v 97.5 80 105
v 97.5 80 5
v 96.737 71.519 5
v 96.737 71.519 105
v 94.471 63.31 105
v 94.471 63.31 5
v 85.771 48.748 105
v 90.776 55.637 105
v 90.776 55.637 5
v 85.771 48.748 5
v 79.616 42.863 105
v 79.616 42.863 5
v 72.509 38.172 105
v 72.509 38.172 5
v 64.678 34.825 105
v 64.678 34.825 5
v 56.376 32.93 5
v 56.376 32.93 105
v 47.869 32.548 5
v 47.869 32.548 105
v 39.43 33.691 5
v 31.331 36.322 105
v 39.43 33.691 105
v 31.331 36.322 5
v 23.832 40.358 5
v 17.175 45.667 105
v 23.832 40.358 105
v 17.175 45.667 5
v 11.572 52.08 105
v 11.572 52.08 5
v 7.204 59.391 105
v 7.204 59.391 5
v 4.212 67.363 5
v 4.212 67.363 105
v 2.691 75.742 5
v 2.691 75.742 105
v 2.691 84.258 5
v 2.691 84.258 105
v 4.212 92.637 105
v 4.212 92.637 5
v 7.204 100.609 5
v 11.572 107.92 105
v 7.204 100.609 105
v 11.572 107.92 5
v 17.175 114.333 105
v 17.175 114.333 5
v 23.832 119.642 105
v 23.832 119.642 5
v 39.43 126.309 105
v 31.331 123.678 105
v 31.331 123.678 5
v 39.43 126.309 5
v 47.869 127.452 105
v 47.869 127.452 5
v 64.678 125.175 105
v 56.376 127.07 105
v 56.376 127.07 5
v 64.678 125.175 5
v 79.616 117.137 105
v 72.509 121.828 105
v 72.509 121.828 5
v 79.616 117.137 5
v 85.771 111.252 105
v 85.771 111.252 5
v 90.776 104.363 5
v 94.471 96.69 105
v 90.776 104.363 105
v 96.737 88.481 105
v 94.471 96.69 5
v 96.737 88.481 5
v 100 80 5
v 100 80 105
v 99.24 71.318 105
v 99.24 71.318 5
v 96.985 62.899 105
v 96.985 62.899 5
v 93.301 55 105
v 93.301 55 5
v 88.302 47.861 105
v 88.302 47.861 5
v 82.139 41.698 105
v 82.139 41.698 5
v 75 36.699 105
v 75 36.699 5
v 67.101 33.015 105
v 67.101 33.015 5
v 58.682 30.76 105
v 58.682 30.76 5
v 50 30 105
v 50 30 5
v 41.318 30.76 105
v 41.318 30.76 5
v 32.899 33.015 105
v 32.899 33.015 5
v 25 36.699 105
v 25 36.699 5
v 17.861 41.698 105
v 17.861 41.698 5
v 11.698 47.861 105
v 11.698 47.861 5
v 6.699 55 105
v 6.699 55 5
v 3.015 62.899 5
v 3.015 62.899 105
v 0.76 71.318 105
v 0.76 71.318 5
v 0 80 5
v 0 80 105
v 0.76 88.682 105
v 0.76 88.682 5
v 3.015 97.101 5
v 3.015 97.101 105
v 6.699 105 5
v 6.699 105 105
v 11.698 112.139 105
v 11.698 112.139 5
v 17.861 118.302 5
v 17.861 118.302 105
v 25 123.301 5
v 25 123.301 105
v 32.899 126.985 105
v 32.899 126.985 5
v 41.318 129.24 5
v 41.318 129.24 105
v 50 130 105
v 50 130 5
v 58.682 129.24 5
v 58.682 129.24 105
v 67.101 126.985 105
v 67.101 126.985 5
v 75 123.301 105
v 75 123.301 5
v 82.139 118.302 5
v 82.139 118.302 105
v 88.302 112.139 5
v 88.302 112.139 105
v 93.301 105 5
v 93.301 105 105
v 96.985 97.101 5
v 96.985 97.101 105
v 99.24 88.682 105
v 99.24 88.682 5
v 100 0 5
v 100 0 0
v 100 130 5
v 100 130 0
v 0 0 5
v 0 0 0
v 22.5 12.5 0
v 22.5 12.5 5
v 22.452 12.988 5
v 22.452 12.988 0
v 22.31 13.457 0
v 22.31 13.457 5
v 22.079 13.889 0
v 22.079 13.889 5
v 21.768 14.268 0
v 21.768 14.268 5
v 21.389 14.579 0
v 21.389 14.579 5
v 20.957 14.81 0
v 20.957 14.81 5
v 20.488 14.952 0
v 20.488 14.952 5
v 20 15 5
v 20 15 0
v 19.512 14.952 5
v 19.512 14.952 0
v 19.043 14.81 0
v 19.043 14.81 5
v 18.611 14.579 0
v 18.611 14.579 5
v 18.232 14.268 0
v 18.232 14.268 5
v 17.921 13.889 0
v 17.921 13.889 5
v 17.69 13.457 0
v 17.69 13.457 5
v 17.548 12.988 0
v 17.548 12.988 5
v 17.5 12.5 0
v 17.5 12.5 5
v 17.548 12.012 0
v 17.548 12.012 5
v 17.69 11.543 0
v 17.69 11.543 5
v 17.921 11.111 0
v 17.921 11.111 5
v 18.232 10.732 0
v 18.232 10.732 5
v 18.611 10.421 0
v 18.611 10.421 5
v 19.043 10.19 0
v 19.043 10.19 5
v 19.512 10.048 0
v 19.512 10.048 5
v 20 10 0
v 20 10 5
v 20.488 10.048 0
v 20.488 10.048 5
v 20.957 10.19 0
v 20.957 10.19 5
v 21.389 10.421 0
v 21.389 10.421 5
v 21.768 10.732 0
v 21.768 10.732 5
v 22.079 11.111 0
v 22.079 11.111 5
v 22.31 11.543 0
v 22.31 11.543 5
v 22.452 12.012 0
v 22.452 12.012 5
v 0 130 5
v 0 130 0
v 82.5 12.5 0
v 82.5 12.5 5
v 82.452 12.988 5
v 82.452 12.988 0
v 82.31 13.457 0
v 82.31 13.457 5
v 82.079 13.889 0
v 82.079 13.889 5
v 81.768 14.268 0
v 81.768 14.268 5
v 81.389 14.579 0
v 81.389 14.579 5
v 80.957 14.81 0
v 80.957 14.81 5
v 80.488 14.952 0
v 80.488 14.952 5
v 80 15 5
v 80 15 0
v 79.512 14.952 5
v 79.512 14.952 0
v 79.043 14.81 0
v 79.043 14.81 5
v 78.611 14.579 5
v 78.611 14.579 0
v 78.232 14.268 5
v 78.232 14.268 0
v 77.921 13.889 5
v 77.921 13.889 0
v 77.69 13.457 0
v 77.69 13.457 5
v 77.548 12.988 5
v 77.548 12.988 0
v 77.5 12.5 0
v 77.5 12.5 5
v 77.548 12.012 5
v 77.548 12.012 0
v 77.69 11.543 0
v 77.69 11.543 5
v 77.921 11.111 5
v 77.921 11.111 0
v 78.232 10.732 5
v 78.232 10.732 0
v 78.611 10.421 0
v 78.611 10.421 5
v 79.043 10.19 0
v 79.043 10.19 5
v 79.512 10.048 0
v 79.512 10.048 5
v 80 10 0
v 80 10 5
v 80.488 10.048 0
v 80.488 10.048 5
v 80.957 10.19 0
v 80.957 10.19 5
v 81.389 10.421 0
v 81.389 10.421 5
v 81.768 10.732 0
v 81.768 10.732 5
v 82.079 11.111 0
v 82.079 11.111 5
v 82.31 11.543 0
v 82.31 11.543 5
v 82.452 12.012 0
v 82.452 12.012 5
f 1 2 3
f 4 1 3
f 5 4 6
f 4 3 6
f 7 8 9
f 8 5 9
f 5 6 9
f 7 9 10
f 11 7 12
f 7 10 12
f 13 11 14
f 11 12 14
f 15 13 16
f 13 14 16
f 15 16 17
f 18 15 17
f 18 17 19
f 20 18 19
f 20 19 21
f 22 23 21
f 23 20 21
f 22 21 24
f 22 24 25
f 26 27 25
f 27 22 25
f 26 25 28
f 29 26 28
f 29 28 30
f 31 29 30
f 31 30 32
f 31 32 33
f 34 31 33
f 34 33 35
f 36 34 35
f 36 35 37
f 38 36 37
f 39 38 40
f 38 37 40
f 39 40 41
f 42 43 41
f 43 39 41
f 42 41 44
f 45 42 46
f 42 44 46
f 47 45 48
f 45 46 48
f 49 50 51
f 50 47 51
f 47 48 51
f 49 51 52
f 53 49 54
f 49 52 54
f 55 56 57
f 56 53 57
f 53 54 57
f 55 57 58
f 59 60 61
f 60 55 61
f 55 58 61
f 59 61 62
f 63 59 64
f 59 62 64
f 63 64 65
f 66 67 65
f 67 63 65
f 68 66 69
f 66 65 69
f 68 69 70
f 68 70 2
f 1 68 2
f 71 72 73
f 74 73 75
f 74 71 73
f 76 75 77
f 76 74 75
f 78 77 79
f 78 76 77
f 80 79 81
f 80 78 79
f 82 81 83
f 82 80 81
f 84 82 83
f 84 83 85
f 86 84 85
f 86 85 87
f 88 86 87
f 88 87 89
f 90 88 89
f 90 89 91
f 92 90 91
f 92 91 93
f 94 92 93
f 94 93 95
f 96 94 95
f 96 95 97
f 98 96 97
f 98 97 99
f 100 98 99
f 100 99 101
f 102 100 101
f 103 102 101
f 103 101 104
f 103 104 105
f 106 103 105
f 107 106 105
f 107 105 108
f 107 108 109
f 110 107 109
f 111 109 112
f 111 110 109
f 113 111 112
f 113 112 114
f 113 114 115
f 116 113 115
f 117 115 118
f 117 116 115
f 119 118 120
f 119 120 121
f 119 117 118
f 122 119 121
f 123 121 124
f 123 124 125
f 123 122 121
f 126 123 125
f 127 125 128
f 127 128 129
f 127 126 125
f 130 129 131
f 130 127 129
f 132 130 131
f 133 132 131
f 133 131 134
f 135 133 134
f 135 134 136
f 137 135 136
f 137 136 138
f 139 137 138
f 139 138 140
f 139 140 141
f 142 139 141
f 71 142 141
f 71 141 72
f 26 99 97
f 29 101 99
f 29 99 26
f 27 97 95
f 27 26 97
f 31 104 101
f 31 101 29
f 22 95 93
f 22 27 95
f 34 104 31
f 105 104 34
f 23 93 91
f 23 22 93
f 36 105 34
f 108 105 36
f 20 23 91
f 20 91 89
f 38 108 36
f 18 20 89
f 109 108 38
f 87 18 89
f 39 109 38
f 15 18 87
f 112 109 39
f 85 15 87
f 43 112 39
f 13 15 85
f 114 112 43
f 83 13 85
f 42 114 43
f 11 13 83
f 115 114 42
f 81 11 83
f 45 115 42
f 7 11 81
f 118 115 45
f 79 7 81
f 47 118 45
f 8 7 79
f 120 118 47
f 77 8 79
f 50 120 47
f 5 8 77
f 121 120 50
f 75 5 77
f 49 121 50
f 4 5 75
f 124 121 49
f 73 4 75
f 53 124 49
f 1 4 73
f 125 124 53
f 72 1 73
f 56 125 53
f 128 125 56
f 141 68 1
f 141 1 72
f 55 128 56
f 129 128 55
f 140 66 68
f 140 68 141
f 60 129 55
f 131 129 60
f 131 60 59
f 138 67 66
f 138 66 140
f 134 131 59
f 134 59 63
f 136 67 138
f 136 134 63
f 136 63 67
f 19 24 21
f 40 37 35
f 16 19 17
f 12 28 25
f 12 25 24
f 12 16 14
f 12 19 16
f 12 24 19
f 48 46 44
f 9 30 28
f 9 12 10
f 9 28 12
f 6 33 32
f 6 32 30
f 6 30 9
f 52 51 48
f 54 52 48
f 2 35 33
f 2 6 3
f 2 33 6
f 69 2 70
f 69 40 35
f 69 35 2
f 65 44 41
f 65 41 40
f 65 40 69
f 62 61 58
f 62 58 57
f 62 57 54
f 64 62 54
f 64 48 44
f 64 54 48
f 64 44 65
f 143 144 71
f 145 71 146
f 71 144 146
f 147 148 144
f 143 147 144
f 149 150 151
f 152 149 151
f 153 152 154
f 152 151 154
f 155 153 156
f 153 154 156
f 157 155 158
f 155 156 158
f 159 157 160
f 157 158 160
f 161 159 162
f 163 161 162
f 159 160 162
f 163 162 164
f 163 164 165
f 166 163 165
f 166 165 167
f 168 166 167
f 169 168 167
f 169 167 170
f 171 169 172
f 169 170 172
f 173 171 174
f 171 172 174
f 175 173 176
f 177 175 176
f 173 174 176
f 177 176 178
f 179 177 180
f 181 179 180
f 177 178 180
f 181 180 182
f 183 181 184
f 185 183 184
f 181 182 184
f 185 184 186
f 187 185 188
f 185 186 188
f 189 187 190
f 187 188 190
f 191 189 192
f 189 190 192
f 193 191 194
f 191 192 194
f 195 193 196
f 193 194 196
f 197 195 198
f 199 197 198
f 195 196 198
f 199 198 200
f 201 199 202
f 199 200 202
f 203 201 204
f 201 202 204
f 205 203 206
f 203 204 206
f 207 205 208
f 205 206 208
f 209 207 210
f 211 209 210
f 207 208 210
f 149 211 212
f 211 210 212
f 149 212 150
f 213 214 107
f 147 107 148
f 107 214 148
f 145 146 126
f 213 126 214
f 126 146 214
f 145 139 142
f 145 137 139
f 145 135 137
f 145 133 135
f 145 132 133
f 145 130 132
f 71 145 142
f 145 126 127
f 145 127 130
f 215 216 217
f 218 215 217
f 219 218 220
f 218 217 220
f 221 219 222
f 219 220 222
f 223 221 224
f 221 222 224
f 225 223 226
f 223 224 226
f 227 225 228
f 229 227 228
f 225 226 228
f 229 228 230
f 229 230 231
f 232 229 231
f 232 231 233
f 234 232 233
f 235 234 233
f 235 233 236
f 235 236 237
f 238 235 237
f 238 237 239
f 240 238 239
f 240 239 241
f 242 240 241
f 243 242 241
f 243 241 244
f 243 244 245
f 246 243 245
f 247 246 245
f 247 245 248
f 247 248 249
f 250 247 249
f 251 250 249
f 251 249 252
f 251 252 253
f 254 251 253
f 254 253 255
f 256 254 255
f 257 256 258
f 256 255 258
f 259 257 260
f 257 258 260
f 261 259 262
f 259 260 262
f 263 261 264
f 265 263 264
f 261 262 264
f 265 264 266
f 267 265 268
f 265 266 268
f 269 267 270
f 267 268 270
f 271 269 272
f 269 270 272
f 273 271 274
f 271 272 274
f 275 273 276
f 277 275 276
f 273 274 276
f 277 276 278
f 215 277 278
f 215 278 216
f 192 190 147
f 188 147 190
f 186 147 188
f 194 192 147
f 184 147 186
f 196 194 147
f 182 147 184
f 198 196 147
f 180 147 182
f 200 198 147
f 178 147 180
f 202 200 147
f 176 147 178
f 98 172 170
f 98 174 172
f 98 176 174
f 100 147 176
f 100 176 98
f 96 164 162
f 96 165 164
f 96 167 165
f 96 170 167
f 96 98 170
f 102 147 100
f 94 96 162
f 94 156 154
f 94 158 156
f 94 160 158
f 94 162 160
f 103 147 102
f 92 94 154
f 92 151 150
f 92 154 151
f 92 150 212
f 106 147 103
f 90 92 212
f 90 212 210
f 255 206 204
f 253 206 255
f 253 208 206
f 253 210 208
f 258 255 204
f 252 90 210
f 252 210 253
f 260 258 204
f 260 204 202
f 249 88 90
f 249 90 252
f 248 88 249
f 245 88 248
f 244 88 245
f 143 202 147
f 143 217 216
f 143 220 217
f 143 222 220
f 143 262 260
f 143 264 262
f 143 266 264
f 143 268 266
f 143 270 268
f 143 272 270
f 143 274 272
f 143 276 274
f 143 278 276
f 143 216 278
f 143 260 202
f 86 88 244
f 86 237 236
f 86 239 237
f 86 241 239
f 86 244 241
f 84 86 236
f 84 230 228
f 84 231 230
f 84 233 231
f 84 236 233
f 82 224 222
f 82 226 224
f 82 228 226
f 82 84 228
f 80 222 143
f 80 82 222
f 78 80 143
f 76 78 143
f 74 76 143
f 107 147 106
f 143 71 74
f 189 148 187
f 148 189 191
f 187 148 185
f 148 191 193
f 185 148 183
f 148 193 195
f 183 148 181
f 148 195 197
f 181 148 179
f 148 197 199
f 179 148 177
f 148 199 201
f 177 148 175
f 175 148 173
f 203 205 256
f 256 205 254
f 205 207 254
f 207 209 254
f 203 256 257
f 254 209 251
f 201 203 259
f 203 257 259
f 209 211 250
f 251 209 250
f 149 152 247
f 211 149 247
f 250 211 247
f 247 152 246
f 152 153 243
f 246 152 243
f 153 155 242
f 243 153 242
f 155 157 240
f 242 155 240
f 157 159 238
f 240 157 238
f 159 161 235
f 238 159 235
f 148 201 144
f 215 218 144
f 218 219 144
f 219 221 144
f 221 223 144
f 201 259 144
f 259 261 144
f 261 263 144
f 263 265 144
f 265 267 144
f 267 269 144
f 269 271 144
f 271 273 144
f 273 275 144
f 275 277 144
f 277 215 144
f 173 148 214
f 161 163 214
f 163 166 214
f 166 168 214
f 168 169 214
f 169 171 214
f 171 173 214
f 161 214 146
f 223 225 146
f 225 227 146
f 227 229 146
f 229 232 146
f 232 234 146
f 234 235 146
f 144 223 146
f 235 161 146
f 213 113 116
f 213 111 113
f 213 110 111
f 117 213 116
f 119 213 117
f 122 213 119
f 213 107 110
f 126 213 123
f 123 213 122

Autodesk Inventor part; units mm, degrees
ref_plane "YZ Plane" through (0, 0, 0) normal (1, 0, 0) x (0, 1, 0)
ref_plane "XZ Plane" through (0, 0, 0) normal (0, 1, 0) x (-1, 0, 0)
ref_plane "XY Plane" through (0, 0, 0) normal (0, 0, 1) x (1, 0, 0)
sketch "Sketch1" plane through (0, 0, 0) normal (0, 0, 1) x (1, 0, 0)
  line L0 (0, 0) -> (100, 0)
  line L1 (100, 0) -> (100, 130)
  line L2 (100, 130) -> (0, 130)
  line L3 (0, 130) -> (0, 0)
  dimension "d0" = 100
  dimension "d1" = 130
extrude "Extrusion1" add sketch "Sketch1" along normal blind 5
sketch "Sketch2" plane through (0, 0, 5) normal (0, 0, 1) x (1, 0, 0)
  line L0 (0, 130) -> (0, 0) projected
  line L1 (100, 130) -> (0, 130) projected
  line L2 (0, 0) -> (100, 0)
  line L3 (100, 0) -> (100, 130)
  line L4 (100, 130) -> (0, 130)
  line L5 (0, 130) -> (0, 0)
  circle A0 centre (50, 80) radius 50
  circle A1 centre (50, 80) radius 47.5
  dimension "d4" = 95
extrude "Extrusion2" add sketch "Sketch2" along normal blind 100 contours A0
sketch "Sketch3" plane through (0, 0, 5) normal (0, 0, 1) x (1, 0, 0)
  line L0 (100, 0) -> (100, 130) projected
  line L1 (0, 80) -> (0, 0) projected
  line L2 (100, 0) -> (0, 0)
  line L3 (0, 0) -> (0, 25)
  line L4 (0, 25) -> (100, 25)
  line L5 (100, 25) -> (100, 0)
  circle A0 centre (80, 12.5) radius 2.5
  circle A1 centre (20, 12.5) radius 2.5
  point P0 (0, 12.5)
  point P1 (100, 12.5)
  dimension "d7" = 25
  dimension "d8" = 5
  dimension "d9" = 5
  dimension "d10" = 20
  dimension "d11" = 20
  dimension "d12" = 12.5
  dimension "d13" = 12.5
extrude "Extrusion3" cut sketch "Sketch3" against normal blind 100 contours A0 | A1
thread "Thread1" size "M5x0.8" class "6H" standard "ANSI Metric M Profile" full length
thread "Thread2" size "M5x0.8" class "6H" standard "ANSI Metric M Profile" full length
properties part number "Reservoir"
